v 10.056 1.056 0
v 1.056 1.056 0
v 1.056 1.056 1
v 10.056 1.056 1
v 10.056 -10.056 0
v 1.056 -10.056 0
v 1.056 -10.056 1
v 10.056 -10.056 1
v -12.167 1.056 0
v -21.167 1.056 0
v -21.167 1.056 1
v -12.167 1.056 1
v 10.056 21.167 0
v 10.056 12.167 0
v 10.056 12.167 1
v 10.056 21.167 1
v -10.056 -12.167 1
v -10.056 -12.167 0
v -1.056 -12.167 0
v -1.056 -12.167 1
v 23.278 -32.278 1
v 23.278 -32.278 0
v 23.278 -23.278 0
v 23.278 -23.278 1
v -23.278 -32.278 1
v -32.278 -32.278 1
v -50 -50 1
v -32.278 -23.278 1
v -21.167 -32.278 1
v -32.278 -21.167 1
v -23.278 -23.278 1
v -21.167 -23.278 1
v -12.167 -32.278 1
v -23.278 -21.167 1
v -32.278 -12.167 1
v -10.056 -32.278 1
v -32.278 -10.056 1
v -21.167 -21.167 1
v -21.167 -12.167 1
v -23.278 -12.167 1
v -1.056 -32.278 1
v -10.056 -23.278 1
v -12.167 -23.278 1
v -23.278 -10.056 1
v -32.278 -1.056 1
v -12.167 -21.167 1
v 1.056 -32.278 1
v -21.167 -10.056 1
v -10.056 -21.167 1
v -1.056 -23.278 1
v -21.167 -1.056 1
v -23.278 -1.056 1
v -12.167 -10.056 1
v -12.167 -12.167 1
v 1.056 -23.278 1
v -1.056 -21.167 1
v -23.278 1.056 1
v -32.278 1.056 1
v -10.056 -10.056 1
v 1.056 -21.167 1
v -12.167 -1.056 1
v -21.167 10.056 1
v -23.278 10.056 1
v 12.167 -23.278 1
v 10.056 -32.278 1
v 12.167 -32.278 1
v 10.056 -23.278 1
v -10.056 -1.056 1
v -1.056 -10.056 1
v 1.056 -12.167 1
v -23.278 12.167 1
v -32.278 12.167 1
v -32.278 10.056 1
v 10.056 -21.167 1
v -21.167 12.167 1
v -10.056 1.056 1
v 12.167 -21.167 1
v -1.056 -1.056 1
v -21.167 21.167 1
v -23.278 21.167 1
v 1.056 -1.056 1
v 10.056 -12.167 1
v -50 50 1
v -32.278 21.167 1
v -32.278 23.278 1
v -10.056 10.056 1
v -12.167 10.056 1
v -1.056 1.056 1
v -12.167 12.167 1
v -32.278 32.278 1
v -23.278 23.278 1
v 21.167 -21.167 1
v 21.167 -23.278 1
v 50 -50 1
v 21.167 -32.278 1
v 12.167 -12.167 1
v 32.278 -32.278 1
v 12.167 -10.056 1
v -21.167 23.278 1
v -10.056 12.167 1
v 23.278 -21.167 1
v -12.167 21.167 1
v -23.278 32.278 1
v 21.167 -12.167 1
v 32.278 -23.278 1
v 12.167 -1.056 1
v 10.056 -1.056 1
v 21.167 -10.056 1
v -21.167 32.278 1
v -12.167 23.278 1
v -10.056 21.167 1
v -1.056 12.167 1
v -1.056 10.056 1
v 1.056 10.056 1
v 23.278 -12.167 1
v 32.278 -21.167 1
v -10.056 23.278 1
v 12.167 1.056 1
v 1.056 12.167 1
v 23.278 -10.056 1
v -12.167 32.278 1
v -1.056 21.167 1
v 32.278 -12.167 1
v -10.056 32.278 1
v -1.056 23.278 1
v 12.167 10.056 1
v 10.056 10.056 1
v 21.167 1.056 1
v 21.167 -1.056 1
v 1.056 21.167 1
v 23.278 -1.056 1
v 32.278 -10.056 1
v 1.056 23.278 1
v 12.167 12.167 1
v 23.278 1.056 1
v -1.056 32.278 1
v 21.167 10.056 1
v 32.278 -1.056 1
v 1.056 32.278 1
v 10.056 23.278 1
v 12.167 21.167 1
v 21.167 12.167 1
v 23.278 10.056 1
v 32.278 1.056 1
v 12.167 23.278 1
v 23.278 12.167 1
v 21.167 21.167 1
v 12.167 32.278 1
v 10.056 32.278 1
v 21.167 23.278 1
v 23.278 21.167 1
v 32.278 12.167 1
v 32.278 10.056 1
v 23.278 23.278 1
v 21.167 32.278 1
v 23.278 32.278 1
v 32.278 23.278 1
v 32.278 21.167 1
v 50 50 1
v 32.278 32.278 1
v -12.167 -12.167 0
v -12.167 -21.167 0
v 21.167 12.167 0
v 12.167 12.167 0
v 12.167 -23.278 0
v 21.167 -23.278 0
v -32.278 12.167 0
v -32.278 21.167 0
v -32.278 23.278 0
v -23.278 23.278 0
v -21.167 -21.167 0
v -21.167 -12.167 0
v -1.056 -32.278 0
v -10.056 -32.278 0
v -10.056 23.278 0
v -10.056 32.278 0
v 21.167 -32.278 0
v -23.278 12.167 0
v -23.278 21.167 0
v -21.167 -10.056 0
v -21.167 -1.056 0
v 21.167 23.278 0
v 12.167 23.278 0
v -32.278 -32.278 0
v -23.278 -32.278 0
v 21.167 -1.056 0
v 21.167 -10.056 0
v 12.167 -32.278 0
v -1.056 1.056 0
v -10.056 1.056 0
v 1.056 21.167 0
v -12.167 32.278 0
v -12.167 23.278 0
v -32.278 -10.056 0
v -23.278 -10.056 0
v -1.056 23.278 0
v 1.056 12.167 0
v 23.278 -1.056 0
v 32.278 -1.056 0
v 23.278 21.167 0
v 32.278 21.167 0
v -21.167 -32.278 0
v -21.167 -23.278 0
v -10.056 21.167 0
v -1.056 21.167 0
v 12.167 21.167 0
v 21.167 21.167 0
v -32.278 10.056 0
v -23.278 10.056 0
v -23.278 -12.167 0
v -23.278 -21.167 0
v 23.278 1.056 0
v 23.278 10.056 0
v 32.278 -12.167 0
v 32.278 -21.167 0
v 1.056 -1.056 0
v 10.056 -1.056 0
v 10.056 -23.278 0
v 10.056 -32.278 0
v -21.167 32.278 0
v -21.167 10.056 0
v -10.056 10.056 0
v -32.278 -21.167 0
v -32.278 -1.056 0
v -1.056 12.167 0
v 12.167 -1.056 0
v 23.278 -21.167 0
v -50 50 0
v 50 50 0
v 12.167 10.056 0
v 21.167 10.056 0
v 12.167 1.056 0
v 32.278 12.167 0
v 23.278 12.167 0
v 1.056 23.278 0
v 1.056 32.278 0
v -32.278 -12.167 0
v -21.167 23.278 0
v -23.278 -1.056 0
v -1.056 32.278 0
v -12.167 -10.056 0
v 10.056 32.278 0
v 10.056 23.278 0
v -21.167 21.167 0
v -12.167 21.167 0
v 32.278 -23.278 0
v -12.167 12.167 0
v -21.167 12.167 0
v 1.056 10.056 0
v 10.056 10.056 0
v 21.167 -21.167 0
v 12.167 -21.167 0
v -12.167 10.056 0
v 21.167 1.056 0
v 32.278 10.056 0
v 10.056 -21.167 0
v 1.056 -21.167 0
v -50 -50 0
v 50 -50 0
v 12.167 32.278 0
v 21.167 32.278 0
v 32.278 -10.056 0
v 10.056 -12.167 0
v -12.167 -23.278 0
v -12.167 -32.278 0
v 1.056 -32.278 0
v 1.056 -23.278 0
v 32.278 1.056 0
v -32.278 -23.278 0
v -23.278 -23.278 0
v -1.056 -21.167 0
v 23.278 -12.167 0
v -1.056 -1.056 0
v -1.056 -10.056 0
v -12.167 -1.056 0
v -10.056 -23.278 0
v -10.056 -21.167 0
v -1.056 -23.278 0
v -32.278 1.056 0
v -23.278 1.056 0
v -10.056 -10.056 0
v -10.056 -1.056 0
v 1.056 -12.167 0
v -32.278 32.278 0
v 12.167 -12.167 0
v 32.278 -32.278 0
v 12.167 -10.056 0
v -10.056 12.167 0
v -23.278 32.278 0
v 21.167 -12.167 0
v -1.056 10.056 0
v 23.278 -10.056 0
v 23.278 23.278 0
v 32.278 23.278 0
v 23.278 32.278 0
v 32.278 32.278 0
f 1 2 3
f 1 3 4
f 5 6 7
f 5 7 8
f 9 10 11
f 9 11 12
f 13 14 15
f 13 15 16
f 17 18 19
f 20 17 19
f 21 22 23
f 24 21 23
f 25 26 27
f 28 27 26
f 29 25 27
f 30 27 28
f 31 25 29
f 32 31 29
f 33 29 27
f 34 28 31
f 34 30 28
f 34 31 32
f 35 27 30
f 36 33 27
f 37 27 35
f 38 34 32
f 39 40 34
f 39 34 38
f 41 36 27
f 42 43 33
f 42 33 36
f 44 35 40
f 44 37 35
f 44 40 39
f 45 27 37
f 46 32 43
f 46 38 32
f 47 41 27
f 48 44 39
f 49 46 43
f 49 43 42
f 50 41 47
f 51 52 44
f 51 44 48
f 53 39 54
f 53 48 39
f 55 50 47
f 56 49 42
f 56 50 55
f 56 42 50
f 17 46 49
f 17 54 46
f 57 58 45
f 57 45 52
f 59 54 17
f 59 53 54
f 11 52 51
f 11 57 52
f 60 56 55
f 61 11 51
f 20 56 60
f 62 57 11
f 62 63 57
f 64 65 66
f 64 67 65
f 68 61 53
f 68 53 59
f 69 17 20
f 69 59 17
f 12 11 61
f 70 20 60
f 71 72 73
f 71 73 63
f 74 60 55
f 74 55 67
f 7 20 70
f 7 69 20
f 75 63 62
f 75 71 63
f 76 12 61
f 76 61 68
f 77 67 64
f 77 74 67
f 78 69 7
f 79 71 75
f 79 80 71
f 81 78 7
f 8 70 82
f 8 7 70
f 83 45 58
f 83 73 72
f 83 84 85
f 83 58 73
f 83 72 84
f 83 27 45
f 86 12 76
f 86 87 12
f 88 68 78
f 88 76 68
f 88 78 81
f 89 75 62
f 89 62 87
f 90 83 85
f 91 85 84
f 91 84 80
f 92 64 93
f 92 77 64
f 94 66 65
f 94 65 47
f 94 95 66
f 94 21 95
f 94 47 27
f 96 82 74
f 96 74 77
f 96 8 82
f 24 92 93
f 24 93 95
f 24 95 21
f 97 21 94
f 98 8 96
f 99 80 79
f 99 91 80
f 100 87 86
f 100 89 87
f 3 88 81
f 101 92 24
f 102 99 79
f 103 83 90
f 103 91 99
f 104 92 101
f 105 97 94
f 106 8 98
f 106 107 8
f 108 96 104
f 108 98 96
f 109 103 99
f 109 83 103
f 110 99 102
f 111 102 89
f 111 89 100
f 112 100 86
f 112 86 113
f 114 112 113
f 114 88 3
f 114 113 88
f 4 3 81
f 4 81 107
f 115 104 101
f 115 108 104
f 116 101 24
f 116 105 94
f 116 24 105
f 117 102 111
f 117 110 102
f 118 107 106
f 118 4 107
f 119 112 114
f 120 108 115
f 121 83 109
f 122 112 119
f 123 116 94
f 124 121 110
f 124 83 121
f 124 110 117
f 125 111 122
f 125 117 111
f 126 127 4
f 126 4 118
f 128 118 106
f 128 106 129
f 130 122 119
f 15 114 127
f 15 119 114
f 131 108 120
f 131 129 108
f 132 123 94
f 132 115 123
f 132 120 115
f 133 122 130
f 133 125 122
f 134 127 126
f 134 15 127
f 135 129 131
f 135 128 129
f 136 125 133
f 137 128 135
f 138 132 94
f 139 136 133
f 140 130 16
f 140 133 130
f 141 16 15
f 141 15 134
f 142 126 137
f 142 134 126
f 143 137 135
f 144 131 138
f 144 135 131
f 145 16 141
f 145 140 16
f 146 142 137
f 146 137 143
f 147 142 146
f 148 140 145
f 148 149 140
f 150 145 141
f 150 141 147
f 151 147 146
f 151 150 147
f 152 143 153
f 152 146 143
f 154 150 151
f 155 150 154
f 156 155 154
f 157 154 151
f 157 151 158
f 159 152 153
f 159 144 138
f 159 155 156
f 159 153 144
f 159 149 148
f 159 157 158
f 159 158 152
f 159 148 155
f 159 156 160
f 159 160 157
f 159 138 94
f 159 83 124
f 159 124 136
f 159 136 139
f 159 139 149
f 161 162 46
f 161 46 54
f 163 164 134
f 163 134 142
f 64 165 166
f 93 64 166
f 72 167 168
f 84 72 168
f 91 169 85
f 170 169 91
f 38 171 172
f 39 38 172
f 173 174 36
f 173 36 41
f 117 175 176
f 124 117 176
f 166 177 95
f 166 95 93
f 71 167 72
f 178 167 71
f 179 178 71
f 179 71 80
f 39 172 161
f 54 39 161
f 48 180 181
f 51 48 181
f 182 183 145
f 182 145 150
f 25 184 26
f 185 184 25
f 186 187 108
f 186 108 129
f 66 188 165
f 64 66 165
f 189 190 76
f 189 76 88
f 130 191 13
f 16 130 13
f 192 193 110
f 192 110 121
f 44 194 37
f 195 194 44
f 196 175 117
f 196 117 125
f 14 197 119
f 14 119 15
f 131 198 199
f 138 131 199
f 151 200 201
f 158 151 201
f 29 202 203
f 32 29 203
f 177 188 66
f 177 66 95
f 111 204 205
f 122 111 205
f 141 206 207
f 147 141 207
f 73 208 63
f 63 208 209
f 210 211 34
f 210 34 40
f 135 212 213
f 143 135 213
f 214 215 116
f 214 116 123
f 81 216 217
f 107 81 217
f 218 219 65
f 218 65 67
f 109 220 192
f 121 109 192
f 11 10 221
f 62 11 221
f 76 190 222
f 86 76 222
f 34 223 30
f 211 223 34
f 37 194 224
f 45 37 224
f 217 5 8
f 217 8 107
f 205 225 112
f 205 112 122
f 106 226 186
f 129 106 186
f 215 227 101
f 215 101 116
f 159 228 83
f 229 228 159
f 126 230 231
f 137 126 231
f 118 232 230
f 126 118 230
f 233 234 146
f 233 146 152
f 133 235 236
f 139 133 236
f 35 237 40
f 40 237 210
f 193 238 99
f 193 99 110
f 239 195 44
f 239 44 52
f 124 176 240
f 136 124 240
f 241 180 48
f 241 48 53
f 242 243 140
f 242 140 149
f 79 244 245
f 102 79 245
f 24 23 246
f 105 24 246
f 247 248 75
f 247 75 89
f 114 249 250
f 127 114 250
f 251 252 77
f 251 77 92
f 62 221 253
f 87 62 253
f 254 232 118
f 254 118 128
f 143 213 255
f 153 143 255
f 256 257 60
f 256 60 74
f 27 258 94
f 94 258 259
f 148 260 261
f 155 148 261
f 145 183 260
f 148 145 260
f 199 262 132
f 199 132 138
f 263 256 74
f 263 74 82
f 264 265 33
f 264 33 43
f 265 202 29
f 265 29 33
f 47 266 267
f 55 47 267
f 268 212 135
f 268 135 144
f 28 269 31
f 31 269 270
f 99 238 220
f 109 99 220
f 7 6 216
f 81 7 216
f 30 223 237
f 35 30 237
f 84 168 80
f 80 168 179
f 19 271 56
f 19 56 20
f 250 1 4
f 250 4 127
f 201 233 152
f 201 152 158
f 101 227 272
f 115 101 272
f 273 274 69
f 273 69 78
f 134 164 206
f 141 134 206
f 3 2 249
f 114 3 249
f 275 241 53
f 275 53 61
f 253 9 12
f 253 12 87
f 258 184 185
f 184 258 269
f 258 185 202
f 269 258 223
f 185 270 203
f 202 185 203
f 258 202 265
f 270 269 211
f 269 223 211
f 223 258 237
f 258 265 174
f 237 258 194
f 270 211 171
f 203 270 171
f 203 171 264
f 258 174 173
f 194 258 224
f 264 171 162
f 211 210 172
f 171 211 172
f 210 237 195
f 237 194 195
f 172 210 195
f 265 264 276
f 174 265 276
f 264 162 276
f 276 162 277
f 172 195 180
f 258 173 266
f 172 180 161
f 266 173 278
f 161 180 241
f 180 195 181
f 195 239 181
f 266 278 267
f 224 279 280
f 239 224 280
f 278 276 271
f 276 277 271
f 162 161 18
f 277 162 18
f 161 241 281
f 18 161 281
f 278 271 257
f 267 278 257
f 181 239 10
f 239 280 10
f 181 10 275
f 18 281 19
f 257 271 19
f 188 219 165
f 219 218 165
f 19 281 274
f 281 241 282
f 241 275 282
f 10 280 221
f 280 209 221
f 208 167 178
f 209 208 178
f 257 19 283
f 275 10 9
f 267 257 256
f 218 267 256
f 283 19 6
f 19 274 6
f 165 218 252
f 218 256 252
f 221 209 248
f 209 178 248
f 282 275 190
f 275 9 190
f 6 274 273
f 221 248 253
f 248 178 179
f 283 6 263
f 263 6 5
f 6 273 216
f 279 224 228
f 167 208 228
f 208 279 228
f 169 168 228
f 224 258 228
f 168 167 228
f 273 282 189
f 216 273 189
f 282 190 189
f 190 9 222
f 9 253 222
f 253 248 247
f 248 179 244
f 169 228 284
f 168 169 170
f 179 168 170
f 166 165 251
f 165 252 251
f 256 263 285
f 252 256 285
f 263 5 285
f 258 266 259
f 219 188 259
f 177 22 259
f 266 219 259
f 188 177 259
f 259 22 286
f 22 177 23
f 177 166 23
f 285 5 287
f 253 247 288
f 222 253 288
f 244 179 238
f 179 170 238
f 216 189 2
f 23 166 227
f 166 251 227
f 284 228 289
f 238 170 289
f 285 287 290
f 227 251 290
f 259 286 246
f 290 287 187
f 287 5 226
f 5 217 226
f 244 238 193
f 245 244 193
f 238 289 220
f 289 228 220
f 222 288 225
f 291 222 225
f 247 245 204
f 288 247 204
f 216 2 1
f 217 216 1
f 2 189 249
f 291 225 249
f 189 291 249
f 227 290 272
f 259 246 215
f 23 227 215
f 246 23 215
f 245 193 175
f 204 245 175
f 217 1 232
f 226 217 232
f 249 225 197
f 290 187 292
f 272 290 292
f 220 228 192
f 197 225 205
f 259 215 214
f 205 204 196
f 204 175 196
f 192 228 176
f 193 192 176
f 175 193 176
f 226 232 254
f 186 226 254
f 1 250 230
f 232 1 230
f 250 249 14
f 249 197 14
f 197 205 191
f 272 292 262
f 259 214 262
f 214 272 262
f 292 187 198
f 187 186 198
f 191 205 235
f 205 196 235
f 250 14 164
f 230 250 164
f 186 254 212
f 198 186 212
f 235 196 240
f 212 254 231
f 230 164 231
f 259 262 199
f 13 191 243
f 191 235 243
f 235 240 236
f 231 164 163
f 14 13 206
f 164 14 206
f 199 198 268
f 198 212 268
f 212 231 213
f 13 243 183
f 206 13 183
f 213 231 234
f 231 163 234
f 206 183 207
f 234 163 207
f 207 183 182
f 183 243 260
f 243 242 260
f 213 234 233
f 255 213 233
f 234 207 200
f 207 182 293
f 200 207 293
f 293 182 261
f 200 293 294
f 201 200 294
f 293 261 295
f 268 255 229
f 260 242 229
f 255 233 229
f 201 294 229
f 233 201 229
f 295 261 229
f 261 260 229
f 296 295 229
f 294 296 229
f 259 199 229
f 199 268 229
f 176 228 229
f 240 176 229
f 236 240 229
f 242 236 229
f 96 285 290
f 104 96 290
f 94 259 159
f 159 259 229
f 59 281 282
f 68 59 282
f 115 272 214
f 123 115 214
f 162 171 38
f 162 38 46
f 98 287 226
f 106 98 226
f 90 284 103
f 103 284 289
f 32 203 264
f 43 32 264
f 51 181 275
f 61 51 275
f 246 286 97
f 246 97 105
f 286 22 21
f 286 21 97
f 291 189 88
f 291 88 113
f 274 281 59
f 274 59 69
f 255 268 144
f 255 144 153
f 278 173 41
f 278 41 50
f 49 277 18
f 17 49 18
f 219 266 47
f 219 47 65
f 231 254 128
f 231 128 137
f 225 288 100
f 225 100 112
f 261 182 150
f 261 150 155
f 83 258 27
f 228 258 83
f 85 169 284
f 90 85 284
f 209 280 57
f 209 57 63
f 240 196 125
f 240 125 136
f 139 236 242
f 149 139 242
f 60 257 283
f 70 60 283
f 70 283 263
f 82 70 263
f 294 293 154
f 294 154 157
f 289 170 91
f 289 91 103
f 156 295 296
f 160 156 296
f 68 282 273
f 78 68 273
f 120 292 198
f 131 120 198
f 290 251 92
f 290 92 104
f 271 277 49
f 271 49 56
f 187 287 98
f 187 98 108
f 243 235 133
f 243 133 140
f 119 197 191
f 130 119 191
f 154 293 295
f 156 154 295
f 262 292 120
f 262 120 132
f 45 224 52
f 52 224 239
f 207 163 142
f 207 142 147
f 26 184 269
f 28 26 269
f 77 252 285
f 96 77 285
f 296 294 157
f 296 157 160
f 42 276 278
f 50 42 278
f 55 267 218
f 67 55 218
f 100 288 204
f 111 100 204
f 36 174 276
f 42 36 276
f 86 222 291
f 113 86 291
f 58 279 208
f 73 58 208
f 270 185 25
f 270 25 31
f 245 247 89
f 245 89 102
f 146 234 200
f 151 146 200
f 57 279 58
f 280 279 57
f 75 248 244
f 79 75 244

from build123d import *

# Parameters (mm, degrees)
SKETCH050_W                        = 100
SKETCH050_H                        = 100
PAD019_DEPTH                       = 1
SKETCH051_W                        = 9
SKETCH051_H                        = 9
POCKET012_DEPTH                    = 283.850783
SKETCH051_LINEARPATTERN002_2_W     = 9
SKETCH051_LINEARPATTERN002_2_H     = 9
POCKET012_LINEARPATTERN002_2_DEPTH = 283.850783
SKETCH051_LINEARPATTERN002_3_W     = 9
SKETCH051_LINEARPATTERN002_3_H     = 9
POCKET012_LINEARPATTERN002_3_DEPTH = 283.850783
SKETCH051_LINEARPATTERN002_4_W     = 9
SKETCH051_LINEARPATTERN002_4_H     = 9
POCKET012_LINEARPATTERN002_4_DEPTH = 283.850783
SKETCH051_LINEARPATTERN002_5_W     = 9
SKETCH051_LINEARPATTERN002_5_H     = 9
POCKET012_LINEARPATTERN002_5_DEPTH = 283.850783
SKETCH051_LINEARPATTERN002_6_W     = 9
SKETCH051_LINEARPATTERN002_6_H     = 9
POCKET012_LINEARPATTERN002_6_DEPTH = 283.850783
LINEARPATTERN003_COUNT             = 6
LINEARPATTERN003_PITCH             = 11.111111


with BuildPart() as part:
    # Sketch050 → Pad019 (new body)
    with BuildSketch(Plane.XY):
        Rectangle(SKETCH050_W, SKETCH050_H)
    extrude(amount=PAD019_DEPTH)

    # Sketch051 → Pocket012 (cut, through all)
    with BuildSketch(Plane.XY):
        with Locations((-27.777778, 27.777778)):
            Rectangle(SKETCH051_W, SKETCH051_H)
    pocket012 = extrude(amount=POCKET012_DEPTH, mode=Mode.SUBTRACT)

    # Sketch051 LinearPattern002 2 → Pocket012 LinearPattern002 2 (cut, through all)
    with BuildSketch(Plane(origin=(11.111111, 0, 0), x_dir=(1, 0, 0), z_dir=(0, 0, 1))):
        with Locations((-27.777778, 27.777778)):
            Rectangle(SKETCH051_LINEARPATTERN002_2_W, SKETCH051_LINEARPATTERN002_2_H)
    pocket012_linearpattern002_2 = extrude(amount=POCKET012_LINEARPATTERN002_2_DEPTH, mode=Mode.SUBTRACT)

    # Sketch051 LinearPattern002 3 → Pocket012 LinearPattern002 3 (cut, through all)
    with BuildSketch(Plane(origin=(22.222222, 0, 0), x_dir=(1, 0, 0), z_dir=(0, 0, 1))):
        with Locations((-27.777778, 27.777778)):
            Rectangle(SKETCH051_LINEARPATTERN002_3_W, SKETCH051_LINEARPATTERN002_3_H)
    pocket012_linearpattern002_3 = extrude(amount=POCKET012_LINEARPATTERN002_3_DEPTH, mode=Mode.SUBTRACT)

    # Sketch051 LinearPattern002 4 → Pocket012 LinearPattern002 4 (cut, through all)
    with BuildSketch(Plane(origin=(33.333333, 0, 0), x_dir=(1, 0, 0), z_dir=(0, 0, 1))):
        with Locations((-27.777778, 27.777778)):
            Rectangle(SKETCH051_LINEARPATTERN002_4_W, SKETCH051_LINEARPATTERN002_4_H)
    pocket012_linearpattern002_4 = extrude(amount=POCKET012_LINEARPATTERN002_4_DEPTH, mode=Mode.SUBTRACT)

    # Sketch051 LinearPattern002 5 → Pocket012 LinearPattern002 5 (cut, through all)
    with BuildSketch(Plane(origin=(44.444444, 0, 0), x_dir=(1, 0, 0), z_dir=(0, 0, 1))):
        with Locations((-27.777778, 27.777778)):
            Rectangle(SKETCH051_LINEARPATTERN002_5_W, SKETCH051_LINEARPATTERN002_5_H)
    pocket012_linearpattern002_5 = extrude(amount=POCKET012_LINEARPATTERN002_5_DEPTH, mode=Mode.SUBTRACT)

    # Sketch051 LinearPattern002 6 → Pocket012 LinearPattern002 6 (cut, through all)
    with BuildSketch(Plane(origin=(55.555556, 0, 0), x_dir=(1, 0, 0), z_dir=(0, 0, 1))):
        with Locations((-27.777778, 27.777778)):
            Rectangle(SKETCH051_LINEARPATTERN002_6_W, SKETCH051_LINEARPATTERN002_6_H)
    pocket012_linearpattern002_6 = extrude(amount=POCKET012_LINEARPATTERN002_6_DEPTH, mode=Mode.SUBTRACT)

    # LinearPattern003: Pocket012, Pocket012 LinearPattern002 2, Pocket012 LinearPattern002 3, Pocket012 LinearPattern002 4, Pocket012 LinearPattern002 5, Pocket012 LinearPattern002 6 ×6
    with Locations(*[(0, -i * LINEARPATTERN003_PITCH, 0) for i in range(1, LINEARPATTERN003_COUNT)]):
        add(pocket012, mode=Mode.SUBTRACT)
        add(pocket012_linearpattern002_2, mode=Mode.SUBTRACT)
        add(pocket012_linearpattern002_3, mode=Mode.SUBTRACT)
        add(pocket012_linearpattern002_4, mode=Mode.SUBTRACT)
        add(pocket012_linearpattern002_5, mode=Mode.SUBTRACT)
        add(pocket012_linearpattern002_6, mode=Mode.SUBTRACT)


solid = part.part
